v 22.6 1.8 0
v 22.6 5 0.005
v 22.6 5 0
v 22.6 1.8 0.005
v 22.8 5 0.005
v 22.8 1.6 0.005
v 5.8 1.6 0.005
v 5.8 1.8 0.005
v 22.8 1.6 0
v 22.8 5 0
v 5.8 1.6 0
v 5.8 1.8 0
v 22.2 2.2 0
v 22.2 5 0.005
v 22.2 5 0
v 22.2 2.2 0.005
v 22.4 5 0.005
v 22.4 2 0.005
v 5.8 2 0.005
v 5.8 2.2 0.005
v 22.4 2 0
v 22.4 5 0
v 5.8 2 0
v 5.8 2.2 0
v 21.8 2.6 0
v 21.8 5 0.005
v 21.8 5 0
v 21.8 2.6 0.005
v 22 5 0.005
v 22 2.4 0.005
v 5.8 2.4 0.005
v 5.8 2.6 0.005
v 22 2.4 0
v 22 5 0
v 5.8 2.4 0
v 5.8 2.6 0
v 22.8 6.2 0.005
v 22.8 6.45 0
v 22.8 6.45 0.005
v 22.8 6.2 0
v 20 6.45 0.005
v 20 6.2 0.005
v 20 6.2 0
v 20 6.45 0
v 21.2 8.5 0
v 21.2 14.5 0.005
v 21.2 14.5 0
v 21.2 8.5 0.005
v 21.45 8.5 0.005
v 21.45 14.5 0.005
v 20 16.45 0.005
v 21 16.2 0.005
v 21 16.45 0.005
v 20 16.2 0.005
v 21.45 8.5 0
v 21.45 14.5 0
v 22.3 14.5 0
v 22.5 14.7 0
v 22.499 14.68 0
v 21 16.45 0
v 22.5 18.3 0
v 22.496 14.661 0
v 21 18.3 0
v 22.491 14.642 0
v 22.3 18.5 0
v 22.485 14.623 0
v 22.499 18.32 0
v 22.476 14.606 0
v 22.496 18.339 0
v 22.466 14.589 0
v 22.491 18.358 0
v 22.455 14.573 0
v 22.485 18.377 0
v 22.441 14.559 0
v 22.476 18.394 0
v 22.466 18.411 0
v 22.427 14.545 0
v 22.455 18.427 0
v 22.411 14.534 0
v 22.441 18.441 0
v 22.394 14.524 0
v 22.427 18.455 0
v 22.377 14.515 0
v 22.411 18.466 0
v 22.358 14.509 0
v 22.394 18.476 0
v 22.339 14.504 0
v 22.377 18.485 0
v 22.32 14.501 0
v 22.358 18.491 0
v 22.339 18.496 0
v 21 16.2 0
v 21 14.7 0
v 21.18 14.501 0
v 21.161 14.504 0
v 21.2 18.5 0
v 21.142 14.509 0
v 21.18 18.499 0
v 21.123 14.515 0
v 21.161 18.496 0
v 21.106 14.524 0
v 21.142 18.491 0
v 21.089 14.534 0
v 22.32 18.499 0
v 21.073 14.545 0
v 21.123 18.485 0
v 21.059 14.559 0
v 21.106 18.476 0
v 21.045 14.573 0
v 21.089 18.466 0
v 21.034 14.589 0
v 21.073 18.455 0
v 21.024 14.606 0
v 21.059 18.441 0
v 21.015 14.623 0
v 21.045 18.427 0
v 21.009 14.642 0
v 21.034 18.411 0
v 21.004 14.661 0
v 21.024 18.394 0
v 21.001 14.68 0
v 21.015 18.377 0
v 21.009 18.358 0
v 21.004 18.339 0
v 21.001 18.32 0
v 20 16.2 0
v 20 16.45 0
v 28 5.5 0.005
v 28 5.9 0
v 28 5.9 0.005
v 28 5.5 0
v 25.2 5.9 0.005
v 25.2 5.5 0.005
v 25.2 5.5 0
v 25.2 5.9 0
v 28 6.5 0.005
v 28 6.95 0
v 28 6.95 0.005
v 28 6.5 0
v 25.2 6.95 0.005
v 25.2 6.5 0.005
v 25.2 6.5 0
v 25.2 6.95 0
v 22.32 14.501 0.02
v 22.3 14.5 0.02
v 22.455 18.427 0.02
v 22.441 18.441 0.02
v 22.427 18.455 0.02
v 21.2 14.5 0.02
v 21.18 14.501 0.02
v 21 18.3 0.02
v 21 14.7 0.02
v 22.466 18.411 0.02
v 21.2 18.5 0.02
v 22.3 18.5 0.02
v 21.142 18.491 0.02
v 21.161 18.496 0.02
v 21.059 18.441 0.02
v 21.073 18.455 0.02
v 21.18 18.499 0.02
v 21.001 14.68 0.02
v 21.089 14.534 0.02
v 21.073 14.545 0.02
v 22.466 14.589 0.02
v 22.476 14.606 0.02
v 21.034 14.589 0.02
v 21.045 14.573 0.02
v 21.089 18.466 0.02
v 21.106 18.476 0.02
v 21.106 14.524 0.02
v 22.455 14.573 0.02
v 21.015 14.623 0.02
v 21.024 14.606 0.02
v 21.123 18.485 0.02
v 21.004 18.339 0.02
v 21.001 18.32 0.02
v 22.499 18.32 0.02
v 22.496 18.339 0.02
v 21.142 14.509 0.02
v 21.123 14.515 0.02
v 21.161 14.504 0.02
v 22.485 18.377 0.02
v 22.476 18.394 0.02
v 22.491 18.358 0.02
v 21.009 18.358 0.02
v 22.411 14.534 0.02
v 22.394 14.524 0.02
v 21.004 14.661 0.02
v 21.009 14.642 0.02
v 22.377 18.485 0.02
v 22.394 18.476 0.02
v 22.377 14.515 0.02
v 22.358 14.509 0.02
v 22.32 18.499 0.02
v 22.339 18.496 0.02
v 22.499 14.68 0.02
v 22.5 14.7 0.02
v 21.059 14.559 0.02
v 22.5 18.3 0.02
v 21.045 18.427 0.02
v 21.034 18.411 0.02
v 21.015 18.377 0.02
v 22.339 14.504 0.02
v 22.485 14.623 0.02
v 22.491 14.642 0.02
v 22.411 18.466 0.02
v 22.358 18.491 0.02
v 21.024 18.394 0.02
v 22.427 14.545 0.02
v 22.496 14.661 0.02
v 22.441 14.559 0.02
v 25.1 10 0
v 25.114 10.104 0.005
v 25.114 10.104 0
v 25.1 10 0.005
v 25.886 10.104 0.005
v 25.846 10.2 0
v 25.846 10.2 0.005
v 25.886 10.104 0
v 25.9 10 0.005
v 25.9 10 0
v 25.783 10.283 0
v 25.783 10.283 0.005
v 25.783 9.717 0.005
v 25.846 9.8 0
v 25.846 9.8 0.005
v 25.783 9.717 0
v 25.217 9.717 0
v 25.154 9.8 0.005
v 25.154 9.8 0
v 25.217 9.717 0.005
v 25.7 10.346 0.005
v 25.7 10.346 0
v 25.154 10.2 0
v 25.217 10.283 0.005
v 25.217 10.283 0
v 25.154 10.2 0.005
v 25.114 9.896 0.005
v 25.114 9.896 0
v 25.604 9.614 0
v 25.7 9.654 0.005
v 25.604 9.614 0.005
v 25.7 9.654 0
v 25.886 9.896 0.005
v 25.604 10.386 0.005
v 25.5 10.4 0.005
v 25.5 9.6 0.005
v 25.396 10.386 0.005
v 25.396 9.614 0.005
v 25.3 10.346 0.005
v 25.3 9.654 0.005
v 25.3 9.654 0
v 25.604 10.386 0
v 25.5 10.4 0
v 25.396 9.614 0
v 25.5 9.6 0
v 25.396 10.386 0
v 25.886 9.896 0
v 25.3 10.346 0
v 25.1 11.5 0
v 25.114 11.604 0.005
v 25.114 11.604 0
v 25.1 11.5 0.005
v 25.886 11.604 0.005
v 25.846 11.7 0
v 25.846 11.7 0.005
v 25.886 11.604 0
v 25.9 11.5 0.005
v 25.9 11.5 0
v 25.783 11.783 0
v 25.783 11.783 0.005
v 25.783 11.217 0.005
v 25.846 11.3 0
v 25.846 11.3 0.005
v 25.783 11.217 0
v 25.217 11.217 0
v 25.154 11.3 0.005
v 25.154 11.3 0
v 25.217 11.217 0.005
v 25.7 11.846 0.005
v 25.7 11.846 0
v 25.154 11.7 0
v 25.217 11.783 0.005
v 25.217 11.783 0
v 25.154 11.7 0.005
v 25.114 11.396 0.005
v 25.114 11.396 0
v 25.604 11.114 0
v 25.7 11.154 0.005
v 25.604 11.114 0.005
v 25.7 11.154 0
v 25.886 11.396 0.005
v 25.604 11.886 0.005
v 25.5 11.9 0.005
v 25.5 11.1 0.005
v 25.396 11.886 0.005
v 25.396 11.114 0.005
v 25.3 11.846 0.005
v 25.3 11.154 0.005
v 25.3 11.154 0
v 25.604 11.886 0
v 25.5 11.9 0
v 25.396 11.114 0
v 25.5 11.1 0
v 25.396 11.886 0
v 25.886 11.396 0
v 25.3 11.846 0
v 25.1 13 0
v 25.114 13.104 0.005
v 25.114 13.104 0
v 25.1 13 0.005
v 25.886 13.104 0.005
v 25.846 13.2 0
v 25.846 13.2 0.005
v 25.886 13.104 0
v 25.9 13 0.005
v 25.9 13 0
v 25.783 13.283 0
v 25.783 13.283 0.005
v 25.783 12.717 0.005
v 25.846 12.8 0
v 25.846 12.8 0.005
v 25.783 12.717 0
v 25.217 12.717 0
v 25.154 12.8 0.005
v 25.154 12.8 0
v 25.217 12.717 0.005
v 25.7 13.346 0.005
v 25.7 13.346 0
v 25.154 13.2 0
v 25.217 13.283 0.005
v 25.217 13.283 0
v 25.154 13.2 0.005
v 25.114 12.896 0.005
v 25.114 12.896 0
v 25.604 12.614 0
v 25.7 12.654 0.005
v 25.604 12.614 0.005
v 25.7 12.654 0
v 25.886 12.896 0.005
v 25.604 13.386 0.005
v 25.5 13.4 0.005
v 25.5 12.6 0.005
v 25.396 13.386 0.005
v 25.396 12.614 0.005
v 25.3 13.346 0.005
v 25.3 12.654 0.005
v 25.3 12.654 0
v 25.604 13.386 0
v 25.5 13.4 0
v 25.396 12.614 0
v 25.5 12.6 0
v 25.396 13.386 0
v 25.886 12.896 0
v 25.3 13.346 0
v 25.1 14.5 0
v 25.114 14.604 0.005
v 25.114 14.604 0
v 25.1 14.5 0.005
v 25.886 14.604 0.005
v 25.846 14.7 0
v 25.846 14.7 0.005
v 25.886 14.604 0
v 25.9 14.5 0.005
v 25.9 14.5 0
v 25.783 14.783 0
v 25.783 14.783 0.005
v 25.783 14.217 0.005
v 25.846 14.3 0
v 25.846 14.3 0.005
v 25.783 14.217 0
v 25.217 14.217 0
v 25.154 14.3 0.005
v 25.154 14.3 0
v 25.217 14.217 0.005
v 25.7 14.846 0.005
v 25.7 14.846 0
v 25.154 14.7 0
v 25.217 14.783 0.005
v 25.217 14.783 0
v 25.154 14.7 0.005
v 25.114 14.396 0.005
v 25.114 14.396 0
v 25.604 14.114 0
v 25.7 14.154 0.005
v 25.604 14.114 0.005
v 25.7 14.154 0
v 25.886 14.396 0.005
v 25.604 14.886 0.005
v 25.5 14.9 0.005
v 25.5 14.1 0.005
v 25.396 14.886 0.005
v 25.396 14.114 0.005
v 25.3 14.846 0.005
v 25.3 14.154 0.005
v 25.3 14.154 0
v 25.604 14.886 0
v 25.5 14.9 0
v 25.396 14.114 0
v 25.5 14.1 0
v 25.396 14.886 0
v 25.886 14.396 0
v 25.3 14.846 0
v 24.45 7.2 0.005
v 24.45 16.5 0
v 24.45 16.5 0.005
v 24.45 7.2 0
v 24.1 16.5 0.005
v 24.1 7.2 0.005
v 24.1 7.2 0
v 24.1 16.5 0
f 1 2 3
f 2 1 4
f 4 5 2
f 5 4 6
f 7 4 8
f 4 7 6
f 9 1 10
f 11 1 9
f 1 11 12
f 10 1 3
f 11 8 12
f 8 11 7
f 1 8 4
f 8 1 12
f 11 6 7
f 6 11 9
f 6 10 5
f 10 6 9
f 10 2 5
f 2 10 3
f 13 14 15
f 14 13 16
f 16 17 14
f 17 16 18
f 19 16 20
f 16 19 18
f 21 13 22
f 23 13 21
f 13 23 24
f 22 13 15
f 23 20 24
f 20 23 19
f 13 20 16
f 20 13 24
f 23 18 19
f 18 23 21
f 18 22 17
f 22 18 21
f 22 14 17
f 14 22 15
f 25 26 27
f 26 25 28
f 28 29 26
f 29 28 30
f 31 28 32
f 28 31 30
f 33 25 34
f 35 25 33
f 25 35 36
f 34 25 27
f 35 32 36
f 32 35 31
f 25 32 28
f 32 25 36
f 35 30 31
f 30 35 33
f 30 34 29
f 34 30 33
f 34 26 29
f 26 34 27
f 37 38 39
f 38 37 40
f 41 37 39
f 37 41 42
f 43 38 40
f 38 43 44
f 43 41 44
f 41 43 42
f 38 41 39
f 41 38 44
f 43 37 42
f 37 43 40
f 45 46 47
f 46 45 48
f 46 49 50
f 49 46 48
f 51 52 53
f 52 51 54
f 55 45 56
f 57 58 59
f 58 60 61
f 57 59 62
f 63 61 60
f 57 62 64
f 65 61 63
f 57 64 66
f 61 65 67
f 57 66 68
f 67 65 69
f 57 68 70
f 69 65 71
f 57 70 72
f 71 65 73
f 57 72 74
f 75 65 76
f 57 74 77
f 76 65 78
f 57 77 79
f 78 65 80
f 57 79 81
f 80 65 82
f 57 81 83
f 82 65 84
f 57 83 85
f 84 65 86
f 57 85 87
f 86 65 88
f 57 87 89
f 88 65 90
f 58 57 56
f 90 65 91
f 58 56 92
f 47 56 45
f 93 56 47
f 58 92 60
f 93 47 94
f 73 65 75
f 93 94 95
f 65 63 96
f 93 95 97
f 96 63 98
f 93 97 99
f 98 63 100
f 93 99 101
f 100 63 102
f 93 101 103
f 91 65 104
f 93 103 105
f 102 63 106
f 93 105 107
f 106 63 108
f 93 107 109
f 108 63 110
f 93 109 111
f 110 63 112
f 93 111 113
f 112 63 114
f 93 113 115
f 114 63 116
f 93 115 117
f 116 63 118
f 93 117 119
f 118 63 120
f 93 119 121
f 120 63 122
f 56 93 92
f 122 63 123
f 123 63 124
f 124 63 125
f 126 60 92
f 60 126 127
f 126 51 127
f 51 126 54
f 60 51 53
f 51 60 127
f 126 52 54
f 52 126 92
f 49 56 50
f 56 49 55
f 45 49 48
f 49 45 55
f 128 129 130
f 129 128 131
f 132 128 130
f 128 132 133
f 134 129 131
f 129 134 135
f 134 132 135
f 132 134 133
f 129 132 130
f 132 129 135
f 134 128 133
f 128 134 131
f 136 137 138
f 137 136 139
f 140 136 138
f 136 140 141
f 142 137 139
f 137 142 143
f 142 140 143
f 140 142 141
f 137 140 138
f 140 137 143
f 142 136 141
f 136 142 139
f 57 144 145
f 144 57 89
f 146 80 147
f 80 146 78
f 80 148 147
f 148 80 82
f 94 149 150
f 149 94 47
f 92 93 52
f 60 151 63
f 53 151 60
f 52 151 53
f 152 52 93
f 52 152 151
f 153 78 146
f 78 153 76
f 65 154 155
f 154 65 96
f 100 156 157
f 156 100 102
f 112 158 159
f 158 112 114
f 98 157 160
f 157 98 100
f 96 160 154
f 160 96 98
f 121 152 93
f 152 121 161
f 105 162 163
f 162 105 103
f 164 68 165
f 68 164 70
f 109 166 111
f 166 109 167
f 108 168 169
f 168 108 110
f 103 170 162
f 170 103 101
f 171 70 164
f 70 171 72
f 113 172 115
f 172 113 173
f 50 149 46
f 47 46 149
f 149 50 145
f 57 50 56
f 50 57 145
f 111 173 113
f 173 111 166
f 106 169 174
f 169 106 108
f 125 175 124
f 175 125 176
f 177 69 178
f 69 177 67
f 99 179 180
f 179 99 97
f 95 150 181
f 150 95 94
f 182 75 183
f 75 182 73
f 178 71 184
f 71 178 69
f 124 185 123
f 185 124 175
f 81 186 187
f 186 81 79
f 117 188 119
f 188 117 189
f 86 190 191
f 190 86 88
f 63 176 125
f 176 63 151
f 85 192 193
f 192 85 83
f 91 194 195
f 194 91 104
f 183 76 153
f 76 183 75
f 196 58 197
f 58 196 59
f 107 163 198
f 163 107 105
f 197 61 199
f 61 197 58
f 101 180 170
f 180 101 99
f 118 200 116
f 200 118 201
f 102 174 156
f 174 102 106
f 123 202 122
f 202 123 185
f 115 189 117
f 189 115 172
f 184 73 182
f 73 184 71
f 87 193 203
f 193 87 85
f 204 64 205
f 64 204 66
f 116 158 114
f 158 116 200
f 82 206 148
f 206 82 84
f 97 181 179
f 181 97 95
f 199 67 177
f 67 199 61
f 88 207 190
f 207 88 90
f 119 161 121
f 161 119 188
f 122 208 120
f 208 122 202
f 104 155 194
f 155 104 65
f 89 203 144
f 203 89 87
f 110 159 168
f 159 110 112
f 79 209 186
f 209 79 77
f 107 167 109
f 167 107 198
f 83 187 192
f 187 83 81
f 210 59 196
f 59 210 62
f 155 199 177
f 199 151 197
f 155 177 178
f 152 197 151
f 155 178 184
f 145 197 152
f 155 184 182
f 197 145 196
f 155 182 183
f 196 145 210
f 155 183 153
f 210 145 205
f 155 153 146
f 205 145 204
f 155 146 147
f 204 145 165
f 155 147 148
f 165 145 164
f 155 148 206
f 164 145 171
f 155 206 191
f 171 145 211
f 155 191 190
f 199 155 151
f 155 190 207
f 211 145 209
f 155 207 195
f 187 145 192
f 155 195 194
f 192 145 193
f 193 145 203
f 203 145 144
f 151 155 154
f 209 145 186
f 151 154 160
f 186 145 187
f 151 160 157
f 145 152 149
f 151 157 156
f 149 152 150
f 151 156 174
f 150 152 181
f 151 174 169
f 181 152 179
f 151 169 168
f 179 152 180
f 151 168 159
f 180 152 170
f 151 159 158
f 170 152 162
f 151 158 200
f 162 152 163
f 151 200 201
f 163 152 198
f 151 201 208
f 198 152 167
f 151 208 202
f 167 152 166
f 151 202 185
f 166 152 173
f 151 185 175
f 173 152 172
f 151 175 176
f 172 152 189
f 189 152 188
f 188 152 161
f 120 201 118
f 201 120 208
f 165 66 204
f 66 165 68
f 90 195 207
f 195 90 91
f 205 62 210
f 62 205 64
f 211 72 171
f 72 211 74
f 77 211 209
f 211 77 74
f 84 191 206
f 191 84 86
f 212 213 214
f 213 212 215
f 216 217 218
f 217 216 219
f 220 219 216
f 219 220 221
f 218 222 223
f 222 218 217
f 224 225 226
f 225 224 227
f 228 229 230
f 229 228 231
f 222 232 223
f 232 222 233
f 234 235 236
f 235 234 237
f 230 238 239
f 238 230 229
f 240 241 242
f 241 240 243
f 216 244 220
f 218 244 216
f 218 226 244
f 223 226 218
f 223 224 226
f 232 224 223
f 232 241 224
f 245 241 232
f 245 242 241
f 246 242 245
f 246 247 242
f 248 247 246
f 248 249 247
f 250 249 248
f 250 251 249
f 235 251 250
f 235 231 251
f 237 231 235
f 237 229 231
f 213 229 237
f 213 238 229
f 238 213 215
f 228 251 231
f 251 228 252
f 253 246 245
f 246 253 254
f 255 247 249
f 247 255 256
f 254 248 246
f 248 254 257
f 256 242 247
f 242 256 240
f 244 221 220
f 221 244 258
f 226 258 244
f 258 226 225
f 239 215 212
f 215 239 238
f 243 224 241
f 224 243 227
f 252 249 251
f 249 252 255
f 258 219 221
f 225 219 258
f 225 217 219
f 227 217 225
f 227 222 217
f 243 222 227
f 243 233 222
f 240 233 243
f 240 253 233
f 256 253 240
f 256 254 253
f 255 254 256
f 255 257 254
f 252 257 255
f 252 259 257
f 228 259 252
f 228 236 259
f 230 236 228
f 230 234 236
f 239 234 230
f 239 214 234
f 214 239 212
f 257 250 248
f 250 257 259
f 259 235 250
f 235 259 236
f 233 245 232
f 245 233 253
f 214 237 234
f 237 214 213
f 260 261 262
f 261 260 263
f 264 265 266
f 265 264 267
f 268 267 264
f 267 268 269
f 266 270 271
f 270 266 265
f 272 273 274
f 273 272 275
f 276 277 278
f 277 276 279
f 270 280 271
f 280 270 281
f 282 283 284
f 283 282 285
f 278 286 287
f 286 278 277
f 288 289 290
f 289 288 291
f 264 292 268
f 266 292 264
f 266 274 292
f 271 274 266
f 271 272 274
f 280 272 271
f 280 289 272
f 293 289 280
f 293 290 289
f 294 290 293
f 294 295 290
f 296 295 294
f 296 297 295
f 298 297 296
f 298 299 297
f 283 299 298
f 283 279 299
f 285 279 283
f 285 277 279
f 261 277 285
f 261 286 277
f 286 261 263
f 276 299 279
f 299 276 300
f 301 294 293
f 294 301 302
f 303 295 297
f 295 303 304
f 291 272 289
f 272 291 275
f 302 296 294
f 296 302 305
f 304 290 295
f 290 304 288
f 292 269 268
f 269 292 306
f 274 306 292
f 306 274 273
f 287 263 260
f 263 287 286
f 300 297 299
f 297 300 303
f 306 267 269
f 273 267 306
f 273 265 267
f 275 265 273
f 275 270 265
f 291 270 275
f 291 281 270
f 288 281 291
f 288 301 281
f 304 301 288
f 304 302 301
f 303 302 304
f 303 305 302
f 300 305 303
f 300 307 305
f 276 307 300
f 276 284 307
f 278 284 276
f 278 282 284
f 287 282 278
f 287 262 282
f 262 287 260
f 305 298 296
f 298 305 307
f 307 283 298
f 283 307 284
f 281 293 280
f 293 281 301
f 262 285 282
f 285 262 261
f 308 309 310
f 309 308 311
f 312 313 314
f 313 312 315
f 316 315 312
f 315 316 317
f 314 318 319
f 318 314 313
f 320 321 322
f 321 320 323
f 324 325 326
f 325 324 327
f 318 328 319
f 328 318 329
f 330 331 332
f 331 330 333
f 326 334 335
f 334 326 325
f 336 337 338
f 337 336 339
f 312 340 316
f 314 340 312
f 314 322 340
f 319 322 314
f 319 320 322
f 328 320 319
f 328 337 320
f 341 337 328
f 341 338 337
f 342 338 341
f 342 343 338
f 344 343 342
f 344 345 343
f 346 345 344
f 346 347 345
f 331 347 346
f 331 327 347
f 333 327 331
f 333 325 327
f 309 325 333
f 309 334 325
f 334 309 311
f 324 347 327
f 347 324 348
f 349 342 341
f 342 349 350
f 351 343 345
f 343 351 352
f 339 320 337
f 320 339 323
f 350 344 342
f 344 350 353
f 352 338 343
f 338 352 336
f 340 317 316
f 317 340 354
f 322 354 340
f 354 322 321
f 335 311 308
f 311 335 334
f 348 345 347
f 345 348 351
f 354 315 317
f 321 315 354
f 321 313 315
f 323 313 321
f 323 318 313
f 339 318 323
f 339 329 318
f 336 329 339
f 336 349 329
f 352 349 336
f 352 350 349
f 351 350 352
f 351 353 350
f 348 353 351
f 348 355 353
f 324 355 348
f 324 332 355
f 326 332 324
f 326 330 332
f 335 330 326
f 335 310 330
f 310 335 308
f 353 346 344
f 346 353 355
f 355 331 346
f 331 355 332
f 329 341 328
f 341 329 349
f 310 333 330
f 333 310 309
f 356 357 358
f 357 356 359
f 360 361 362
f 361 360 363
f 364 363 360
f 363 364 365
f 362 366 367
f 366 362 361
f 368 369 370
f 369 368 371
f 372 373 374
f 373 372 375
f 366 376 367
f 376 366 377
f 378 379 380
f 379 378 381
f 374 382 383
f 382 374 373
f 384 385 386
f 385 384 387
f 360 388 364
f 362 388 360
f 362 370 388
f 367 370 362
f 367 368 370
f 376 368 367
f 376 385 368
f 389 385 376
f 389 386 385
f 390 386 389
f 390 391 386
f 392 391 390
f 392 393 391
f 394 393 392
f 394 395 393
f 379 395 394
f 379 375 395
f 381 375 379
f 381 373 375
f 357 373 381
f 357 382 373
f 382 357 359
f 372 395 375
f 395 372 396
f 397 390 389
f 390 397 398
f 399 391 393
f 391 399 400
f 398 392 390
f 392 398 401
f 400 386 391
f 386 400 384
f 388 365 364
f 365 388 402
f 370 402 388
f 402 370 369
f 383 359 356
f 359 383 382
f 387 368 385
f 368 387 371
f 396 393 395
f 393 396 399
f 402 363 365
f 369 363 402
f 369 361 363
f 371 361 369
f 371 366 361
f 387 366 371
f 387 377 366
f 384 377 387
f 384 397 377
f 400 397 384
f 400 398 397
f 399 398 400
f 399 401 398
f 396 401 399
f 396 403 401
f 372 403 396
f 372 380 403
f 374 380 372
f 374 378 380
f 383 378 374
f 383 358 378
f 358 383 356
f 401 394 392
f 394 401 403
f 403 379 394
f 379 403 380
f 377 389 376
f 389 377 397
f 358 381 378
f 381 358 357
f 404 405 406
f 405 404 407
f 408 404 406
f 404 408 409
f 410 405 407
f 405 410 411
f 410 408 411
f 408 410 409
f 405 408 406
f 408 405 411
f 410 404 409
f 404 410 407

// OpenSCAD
// file: ../Common/params.scad
// =========================================================================
// PencilAI - Common Parameters, Colors & Utility Library
// File: CAD Modelling/Common/params.scad
// =========================================================================

// --- Resolution Settings ---
$fn = 64;

// --- Physical Strip Dimensions (mm) ---
STRIP_LEN        = 54.0;   // Length of flexible tape (wraps ~1.9x on 9mm barrel)
STRIP_WID        = 20.0;   // Width of tape along the pen axis (grip zone height)
STRIP_CORNER_R   = 2.0;    // Rounded corner radius to prevent peeling

// --- Layer Heights & Z-Stackup (mm) ---
THICK_ADHESIVE   = 0.055;  // Skin-safe medical acrylic adhesive
THICK_KAPTON     = 0.025;  // Flexible Polyimide film substrate (25 um)
THICK_BASE       = THICK_ADHESIVE + THICK_KAPTON; // 0.080 mm base

THICK_COPPER     = 0.020;  // Etched copper traces (1/2 oz / 18-20 um)
THICK_GOLD       = 0.005;  // ENIG surface finish plating
THICK_CARBON     = 0.030;  // Screen-printed carbon resistive ink (30 um)
THICK_SPACER     = 0.015;  // Dielectric spacer dot height

THICK_TPU_SKIN   = 0.450;  // Translucent matte TPU outer protective grip film
THICK_TOTAL_MAX  = 0.530;  // Target total profile thickness: 0.53 mm

// --- Component Dimensions (mm) ---
// ST LIS2DH12 Ultra-low-power 3-axis accelerometer (WLCSP-12)
ACCEL_LEN        = 1.60;
ACCEL_WID        = 1.60;
ACCEL_H          = 0.40;   // Ultra-thin WLCSP package
ACCEL_BALL_PITCH = 0.40;   // 3x4 solder ball matrix
ACCEL_BALL_DIA   = 0.22;

// BLE Beacon SoC (InPlay IN100 / Nordic nRF52810 WLCSP)
BLE_LEN          = 2.20;
BLE_WID          = 2.20;
BLE_H            = 0.35;   // 0.35 mm profile
BLE_BALL_PITCH   = 0.45;   // 4x4 solder ball matrix
BLE_BALL_DIA     = 0.24;

// Ultra-Thin Printed Zinc-Manganese (Zn-Mn) Flexible Battery
BAT_LEN          = 16.5;   // Main pouch length
BAT_WID          = 12.6;   // Main pouch width
BAT_H            = 0.45;   // Printed paper battery thickness (0.45 mm)
BAT_SEAL_MARGIN  = 1.0;    // Perimeter foil crimp seal width
BAT_TAB_LEN      = 2.4;    // Terminal connector tab length
BAT_TAB_WID      = 1.2;    // Terminal tab width

// Interdigitated Carbon FSR Pinch Zone
FSR_LEN          = 17.5;
FSR_WID          = 13.6;
FSR_FINGERS      = 16;
FSR_BUS_WID      = 0.60;

// Serpentine 2.4 GHz Antenna
ANT_LOOPS        = 6;
ANT_STEP         = 1.40;
ANT_AMP          = 2.40;
ANT_TRACE_WID    = 0.35;

// Reference Pen
PEN_DIAMETER_DEFAULT = 9.0; // Standard ballpoint barrel (mm)

// --- Color Palette (RGBA) ---
C_KAPTON         = [0.85, 0.48, 0.08, 0.88]; // Translucent Amber Polyimide
C_ADHESIVE       = [0.95, 0.95, 0.92, 0.50]; // Clear skin-safe acrylic adhesive
C_RELEASE_LINER  = [0.98, 0.98, 0.96, 0.95]; // White silicone-coated pull tab
C_TPU_SKIN       = [0.18, 0.19, 0.22, 0.55]; // Translucent Charcoal Matte TPU
C_TPU_OPAQUE     = [0.14, 0.15, 0.17, 1.00]; // Grip ridges / tactile accents
C_COPPER         = [0.85, 0.45, 0.22, 1.00]; // Raw Etched Copper
C_GOLD           = [0.92, 0.74, 0.20, 1.00]; // ENIG Gold Plating
C_CARBON         = [0.12, 0.12, 0.13, 0.98]; // Screen-Printed Carbon Ink
C_DIELECTRIC     = [0.20, 0.65, 0.40, 0.75]; // Green/Teal Dielectric Spacer
C_SILICON        = [0.09, 0.10, 0.12, 1.00]; // WLCSP Mirror Silicon Die
C_SOLDER         = [0.76, 0.78, 0.82, 1.00]; // SAC305 Lead-Free Solder
C_CERAMIC        = [0.70, 0.58, 0.46, 1.00]; // 0201 MLCC Brown Ceramic
C_BATTERY_FOIL   = [0.80, 0.82, 0.85, 1.00]; // Hermetic Aluminum/Poly Pouch
C_BATTERY_SEAL   = [0.65, 0.67, 0.70, 1.00]; // Crimped Pouch Flange
C_BAT_ACCENT     = [0.15, 0.45, 0.75, 1.00]; // Insulator Layer / Branding
C_PEN_BARREL     = [0.93, 0.94, 0.96, 0.90]; // Smooth Polycarbonate Barrel
C_PEN_CHROME     = [0.84, 0.86, 0.89, 1.00]; // Mirror Chrome Trim
C_PEN_BRASS      = [0.86, 0.70, 0.28, 1.00]; // Machined Brass Tip Collar
C_PEN_BALL       = [0.35, 0.36, 0.38, 1.00]; // Tungsten Carbide Ball
C_PEN_INK        = [0.05, 0.10, 0.35, 1.00]; // Blue Ink Column inside refill

// --- Reusable Geometric Modules ---

// 2D Rounded Rectangle (Centered or Corner Origin)
module rounded_rect_2d(length, width, radius, center = false) {
    tx = center ? -length / 2 : 0;
    ty = center ? -width / 2 : 0;
    translate([tx, ty])
        offset(r = radius)
            offset(delta = -radius)
                square([length, width]);
}

// 3D Rounded Extruded Plate
module rounded_box(length, width, height, radius, center = false) {
    linear_extrude(height = height)
        rounded_rect_2d(length, width, radius, center = center);
}

// Spherical Solder Ball
module solder_ball(diameter) {
    color(C_SOLDER)
        sphere(d = diameter, $fn = 32);
}

// SMD 0201 / 01005 Passive Component (Capacitor / Inductor / Resistor)
module smd_passive_0201(len = 0.60, wid = 0.30, height = 0.30, body_color = C_CERAMIC) {
    term_len = 0.15;
    // Central Ceramic/Ferrite Body
    color(body_color)
        translate([term_len, 0, 0])
            cube([len - 2 * term_len, wid, height]);
    // Silver End Terminations
    color(C_SOLDER) {
        cube([term_len, wid, height]);
        translate([len - term_len, 0, 0])
            cube([term_len, wid, height]);
    }
}

// Circular Fiducial Alignment Marker (for high-precision flex assembly)
module fiducial_marker(diameter = 1.0, copper_h = THICK_COPPER) {
    color(C_GOLD)
        cylinder(d = diameter, h = copper_h, $fn = 32);
    color(C_KAPTON)
        difference() {
            cylinder(d = diameter * 2.2, h = copper_h + 0.001, $fn = 32);
            cylinder(d = diameter * 1.4, h = copper_h + 0.002, $fn = 32);
        }
}
// main file
// =========================================================================
// PencilAI - Flexible Circuit Routing & Interconnect Traces
// File: CAD Modelling/Electronics/flex_circuit_traces.scad
// =========================================================================

include <../Common/params.scad>

// --- View Controls (when rendered directly) ---
show_bus_traces   = true;   // Accelerometer I2C/SPI lines & Interrupts
show_power_rails  = true;   // VDD & GND ground return plane
show_test_points  = true;   // SWD / Factory programming test pads
show_fsr_sense    = true;   // FSR analog sense lines

module flex_traces(x = 0, y = 0, z = THICK_BASE) {
    translate([x, y, z]) {
        color(C_GOLD) {
            // 1. Accelerometer -> BLE SoC Bus (SCL, SDA, INT1)
            if (show_bus_traces) {
                // Line 1: SCL
                translate([5.8, 1.6, 0]) cube([16.8, 0.20, THICK_GOLD]);
                translate([22.6, 1.6, 0]) cube([0.20, 3.4, THICK_GOLD]);

                // Line 2: SDA
                translate([5.8, 2.0, 0]) cube([16.4, 0.20, THICK_GOLD]);
                translate([22.2, 2.0, 0]) cube([0.20, 3.0, THICK_GOLD]);

                // Line 3: INT1 (Motion Wake-Up Trigger)
                translate([5.8, 2.4, 0]) cube([16.0, 0.20, THICK_GOLD]);
                translate([21.8, 2.4, 0]) cube([0.20, 2.6, THICK_GOLD]);
            }

            // 2. FSR -> BLE SoC Sense Line
            if (show_fsr_sense) {
                translate([20.0, 6.2, 0]) cube([2.8, 0.25, THICK_GOLD]);
                translate([20.0, 16.2, 0]) cube([1.2, 0.25, THICK_GOLD]);
                translate([21.2, 8.5, 0]) cube([0.25, 7.9, THICK_GOLD]);
            }

            // 3. BLE SoC -> 2.4 GHz Antenna RF Microstrip Feed
            translate([24.1, 7.2, 0]) cube([0.35, 9.3, THICK_GOLD]);

            // 4. Battery -> BLE SoC Power Rails (VDD & GND)
            if (show_power_rails) {
                // Positive Rail (VDD 1.5V - 3.0V)
                translate([25.2, 5.5, 0]) cube([2.8, 0.40, THICK_GOLD]);
                // Ground Return Rail (GND)
                translate([25.2, 6.5, 0]) cube([2.8, 0.45, THICK_GOLD]);

                // Ground plane copper patch under RF section
                translate([21.0, 14.5, 0])
                    rounded_box(1.5, 4.0, THICK_COPPER, 0.2);
            }

            // 5. Factory SWD Programming & Calibration Test Points (1.0mm dia pads)
            if (show_test_points) {
                translate([25.5, 10.0, 0]) cylinder(d = 0.8, h = THICK_GOLD, $fn = 24);
                translate([25.5, 11.5, 0]) cylinder(d = 0.8, h = THICK_GOLD, $fn = 24);
                translate([25.5, 13.0, 0]) cylinder(d = 0.8, h = THICK_GOLD, $fn = 24);
                translate([25.5, 14.5, 0]) cylinder(d = 0.8, h = THICK_GOLD, $fn = 24);
            }
        }
    }
}

// Standalone Render
flex_traces(x = 0, y = 0, z = 0);
